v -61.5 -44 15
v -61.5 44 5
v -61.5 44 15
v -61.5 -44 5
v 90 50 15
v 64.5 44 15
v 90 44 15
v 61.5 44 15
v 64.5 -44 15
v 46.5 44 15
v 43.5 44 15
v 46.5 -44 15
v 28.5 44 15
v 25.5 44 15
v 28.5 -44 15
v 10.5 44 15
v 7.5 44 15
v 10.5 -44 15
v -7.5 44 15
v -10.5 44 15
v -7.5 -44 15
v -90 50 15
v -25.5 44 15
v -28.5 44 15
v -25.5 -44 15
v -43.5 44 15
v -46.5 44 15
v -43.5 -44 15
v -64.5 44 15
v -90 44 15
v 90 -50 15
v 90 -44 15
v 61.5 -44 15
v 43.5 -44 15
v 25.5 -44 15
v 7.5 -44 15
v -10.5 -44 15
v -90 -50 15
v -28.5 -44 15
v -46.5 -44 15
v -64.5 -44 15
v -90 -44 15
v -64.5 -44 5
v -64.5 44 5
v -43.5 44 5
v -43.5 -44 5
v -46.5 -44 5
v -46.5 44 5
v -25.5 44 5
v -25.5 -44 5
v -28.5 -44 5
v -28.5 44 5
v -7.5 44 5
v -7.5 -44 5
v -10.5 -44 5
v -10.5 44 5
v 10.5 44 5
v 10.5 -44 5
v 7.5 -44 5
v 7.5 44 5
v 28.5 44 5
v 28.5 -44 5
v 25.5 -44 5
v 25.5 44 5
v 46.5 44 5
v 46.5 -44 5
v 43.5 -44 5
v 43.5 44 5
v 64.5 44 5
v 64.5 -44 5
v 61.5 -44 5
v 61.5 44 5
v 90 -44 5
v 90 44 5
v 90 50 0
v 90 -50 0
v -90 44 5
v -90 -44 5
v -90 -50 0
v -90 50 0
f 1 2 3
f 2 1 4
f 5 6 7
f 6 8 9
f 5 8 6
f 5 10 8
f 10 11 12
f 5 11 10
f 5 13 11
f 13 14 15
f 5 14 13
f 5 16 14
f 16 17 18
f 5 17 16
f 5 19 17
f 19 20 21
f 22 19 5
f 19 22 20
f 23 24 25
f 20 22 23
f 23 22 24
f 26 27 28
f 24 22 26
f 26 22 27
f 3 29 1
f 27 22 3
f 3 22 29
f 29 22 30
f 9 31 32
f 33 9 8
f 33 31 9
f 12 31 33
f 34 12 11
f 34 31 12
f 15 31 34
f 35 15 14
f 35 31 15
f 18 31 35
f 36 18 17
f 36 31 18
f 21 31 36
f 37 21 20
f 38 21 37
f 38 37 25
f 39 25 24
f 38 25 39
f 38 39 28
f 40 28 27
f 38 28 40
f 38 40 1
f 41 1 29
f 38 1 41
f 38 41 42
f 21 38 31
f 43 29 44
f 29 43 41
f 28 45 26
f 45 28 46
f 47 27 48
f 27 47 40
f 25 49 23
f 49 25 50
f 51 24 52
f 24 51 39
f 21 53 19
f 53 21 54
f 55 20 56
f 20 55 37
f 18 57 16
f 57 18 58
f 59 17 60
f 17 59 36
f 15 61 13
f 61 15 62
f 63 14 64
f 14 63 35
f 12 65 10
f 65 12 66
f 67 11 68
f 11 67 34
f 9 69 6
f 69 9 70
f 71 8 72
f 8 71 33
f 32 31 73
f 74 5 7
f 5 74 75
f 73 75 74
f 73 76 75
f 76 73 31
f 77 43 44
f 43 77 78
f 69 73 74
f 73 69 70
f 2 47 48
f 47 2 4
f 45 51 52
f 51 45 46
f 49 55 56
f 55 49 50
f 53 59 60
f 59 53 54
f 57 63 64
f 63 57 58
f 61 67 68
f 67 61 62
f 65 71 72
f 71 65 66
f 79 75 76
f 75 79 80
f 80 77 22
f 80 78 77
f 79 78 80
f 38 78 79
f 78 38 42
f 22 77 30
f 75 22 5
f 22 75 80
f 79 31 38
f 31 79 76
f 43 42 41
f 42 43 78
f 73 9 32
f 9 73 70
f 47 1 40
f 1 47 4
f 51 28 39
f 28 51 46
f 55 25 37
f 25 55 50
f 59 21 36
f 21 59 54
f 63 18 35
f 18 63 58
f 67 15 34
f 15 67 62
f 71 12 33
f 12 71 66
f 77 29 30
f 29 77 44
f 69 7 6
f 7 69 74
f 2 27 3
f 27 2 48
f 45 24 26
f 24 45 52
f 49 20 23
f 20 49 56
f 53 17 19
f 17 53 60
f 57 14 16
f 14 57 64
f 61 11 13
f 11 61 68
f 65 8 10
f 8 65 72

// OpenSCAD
$fn = 32;

// ----------------------------------------------------------------------
// Rib frame 180 x 100 x 15
// 8 ribs at 18 mm pitch
// ----------------------------------------------------------------------

// --- parameters (mm) ---
frame = [180, 100, 5];  // base plate size (x, y, z)
seat_tol = 0.1;         // tolerance at the seating features
free_tol = 0.3;         // general tolerance on the free sizes
rail_w = 6;             // side rail width
ribs = 8;               // number of ribs
rib_t = 3;              // rib thickness
rib_h = 10;             // rib height above the base plate
pitch = 18;             // pitch between rib centres

// --- derived feature positions (mm) ---
span = (ribs - 1) * pitch;          // = 126   distance between the outer ribs
origin_x = -span / 2;               // = -63   X of the first rib
rib_len = frame[1] - 2 * rail_w + 2;  // = 90   rib length, 1 mm into each rail
feature_centers = [
  [origin_x + 0 * pitch, 0],
  [origin_x + 1 * pitch, 0],
  [origin_x + 2 * pitch, 0],
  [origin_x + 3 * pitch, 0],
  [origin_x + 4 * pitch, 0],
  [origin_x + 5 * pitch, 0],
  [origin_x + 6 * pitch, 0],
  [origin_x + 7 * pitch, 0]
];   // rib centre line, drives the rib loop

// base plate, two side rails, then the ribs read straight off feature_centers
union() {
  translate([-frame[0] / 2, -frame[1] / 2, 0]) cube(frame);
  translate([-frame[0] / 2, -frame[1] / 2, 0]) cube([frame[0], rail_w, frame[2] + rib_h]);
  translate([-frame[0] / 2, frame[1] / 2 - rail_w, 0]) cube([frame[0], rail_w, frame[2] + rib_h]);
  for (centre = feature_centers)
    translate([centre[0] - rib_t / 2, centre[1] - rib_len / 2, frame[2] - 1])
      cube([rib_t, rib_len, rib_h + 1]);
}
